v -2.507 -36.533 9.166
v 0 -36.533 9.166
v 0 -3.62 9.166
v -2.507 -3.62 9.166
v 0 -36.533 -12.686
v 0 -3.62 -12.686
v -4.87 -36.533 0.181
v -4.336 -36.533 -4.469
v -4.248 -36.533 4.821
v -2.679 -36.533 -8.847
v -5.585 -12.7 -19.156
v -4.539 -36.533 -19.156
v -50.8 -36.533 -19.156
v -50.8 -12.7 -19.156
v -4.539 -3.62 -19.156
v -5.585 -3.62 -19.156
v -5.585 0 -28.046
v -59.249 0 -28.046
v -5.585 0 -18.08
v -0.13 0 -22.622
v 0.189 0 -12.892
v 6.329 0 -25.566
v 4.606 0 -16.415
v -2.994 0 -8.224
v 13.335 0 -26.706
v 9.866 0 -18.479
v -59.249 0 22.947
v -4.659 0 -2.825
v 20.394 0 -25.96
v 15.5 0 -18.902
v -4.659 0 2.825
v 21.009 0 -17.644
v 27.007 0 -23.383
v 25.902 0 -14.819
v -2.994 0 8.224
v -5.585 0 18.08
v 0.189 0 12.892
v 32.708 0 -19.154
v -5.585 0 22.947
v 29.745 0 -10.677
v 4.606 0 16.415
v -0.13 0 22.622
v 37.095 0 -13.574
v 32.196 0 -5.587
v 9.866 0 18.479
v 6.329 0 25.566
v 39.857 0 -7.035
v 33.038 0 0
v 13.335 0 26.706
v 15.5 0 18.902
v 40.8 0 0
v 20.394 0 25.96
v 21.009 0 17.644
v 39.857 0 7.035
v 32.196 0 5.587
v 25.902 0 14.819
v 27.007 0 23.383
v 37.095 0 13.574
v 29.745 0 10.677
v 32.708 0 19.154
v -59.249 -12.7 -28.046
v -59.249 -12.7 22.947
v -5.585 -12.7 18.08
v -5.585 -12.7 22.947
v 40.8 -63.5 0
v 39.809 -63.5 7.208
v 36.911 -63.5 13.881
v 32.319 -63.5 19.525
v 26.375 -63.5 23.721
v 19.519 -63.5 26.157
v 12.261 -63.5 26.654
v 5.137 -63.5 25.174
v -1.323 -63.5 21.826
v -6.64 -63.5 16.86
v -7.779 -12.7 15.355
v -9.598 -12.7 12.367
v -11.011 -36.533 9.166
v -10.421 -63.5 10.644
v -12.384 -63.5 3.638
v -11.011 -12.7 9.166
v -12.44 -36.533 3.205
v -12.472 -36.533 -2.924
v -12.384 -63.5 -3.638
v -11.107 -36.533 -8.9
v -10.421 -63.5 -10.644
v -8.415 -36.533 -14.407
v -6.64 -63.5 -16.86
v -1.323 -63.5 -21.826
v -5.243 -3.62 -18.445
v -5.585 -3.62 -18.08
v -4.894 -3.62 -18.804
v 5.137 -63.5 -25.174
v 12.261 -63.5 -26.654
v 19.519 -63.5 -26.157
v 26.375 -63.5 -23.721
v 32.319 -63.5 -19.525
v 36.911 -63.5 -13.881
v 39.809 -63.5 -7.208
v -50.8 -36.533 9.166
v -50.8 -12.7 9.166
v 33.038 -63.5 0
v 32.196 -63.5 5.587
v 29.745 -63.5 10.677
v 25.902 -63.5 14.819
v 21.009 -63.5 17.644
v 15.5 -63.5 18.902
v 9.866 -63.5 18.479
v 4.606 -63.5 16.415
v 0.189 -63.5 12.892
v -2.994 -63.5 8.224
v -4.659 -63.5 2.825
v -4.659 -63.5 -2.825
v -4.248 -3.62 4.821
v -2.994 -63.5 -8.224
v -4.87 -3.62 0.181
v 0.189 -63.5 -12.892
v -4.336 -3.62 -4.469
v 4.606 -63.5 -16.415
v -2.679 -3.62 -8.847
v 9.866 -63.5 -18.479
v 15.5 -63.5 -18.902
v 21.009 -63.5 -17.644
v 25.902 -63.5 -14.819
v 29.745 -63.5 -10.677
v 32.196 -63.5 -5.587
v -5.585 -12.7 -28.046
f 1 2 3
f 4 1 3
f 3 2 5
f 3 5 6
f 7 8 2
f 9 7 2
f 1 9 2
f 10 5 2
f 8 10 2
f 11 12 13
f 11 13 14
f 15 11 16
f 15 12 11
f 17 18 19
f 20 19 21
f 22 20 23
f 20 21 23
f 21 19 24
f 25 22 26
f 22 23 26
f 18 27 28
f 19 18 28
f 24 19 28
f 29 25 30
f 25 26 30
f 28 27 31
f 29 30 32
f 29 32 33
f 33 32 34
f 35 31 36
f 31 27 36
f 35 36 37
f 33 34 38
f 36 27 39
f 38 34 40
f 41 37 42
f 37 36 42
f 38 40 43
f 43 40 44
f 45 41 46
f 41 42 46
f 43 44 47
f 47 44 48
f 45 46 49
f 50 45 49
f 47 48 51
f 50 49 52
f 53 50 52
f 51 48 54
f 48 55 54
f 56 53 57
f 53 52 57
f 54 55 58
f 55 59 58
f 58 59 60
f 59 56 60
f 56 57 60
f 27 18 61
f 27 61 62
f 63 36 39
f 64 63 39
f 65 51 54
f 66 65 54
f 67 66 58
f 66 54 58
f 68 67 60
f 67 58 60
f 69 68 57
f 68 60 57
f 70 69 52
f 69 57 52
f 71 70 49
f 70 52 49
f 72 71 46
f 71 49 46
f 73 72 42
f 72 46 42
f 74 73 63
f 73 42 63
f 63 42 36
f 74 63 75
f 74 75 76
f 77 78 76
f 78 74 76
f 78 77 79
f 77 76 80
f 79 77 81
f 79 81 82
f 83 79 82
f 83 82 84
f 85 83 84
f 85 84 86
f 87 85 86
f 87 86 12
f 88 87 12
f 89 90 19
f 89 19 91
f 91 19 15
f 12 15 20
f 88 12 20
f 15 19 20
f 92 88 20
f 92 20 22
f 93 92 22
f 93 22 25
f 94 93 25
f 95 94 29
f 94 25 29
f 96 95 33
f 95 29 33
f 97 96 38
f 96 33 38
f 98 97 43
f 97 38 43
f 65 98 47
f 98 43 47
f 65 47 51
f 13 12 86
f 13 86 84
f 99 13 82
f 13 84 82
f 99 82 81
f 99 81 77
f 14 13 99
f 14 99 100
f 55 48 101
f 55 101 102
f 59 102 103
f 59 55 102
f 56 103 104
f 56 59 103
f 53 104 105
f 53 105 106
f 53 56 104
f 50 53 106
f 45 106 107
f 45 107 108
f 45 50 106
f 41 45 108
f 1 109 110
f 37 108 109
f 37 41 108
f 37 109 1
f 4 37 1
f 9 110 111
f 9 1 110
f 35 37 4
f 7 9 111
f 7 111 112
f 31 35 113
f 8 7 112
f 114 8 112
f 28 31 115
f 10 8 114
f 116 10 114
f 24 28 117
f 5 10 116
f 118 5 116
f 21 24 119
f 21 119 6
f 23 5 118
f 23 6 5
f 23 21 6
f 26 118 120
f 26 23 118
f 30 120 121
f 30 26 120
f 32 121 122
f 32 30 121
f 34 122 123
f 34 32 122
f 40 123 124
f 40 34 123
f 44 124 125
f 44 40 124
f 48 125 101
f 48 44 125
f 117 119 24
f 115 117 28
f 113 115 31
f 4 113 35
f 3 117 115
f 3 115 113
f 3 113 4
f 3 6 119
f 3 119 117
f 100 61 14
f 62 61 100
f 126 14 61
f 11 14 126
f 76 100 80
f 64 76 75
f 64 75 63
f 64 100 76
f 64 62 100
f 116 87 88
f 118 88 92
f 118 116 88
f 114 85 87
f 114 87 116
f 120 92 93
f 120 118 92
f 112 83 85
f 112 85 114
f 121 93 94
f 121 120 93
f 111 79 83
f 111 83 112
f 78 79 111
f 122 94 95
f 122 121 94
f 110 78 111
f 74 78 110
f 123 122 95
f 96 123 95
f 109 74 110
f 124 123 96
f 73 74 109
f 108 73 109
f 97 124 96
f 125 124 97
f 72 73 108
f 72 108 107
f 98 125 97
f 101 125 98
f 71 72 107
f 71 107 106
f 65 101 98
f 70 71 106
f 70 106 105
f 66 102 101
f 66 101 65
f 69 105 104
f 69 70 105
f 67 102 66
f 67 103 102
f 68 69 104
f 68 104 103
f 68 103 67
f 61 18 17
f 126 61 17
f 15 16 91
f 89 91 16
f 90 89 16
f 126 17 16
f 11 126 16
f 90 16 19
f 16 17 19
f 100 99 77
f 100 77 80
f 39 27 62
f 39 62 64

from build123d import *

# Parameters (mm, degrees)
F1_R     = 26.716265
F1_R_2   = 18.954544
F2_DEPTH = 63.5
F0_W     = 53.663762
F0_H     = 50.992716
F3_DEPTH = 12.7
F4_W     = 32.913139
F4_H     = 28.322212
F5_DEPTH = 50.8


with BuildPart() as f2:
    # F1 (on Front) → F2 (new body)
    with BuildSketch(Plane.XZ):
        with Locations((14.083703, 0)):
            Circle(F1_R)
        with Locations((14.083703, 0)):
            Circle(F1_R_2, mode=Mode.SUBTRACT)
    extrude(amount=F2_DEPTH)

    # F0 (on Front) → F3 (join)
    with BuildSketch(Plane.XZ):
        with Locations((-32.416797, -2.549635)):
            Rectangle(F0_W, F0_H)
    extrude(amount=F3_DEPTH)

    # F4 (on Right) → F5 (join)
    with BuildSketch(Plane.YZ):
        with Locations((-20.076167, -4.994778)):
            Rectangle(F4_W, F4_H)
    extrude(amount=-F5_DEPTH)


solid = f2.part
